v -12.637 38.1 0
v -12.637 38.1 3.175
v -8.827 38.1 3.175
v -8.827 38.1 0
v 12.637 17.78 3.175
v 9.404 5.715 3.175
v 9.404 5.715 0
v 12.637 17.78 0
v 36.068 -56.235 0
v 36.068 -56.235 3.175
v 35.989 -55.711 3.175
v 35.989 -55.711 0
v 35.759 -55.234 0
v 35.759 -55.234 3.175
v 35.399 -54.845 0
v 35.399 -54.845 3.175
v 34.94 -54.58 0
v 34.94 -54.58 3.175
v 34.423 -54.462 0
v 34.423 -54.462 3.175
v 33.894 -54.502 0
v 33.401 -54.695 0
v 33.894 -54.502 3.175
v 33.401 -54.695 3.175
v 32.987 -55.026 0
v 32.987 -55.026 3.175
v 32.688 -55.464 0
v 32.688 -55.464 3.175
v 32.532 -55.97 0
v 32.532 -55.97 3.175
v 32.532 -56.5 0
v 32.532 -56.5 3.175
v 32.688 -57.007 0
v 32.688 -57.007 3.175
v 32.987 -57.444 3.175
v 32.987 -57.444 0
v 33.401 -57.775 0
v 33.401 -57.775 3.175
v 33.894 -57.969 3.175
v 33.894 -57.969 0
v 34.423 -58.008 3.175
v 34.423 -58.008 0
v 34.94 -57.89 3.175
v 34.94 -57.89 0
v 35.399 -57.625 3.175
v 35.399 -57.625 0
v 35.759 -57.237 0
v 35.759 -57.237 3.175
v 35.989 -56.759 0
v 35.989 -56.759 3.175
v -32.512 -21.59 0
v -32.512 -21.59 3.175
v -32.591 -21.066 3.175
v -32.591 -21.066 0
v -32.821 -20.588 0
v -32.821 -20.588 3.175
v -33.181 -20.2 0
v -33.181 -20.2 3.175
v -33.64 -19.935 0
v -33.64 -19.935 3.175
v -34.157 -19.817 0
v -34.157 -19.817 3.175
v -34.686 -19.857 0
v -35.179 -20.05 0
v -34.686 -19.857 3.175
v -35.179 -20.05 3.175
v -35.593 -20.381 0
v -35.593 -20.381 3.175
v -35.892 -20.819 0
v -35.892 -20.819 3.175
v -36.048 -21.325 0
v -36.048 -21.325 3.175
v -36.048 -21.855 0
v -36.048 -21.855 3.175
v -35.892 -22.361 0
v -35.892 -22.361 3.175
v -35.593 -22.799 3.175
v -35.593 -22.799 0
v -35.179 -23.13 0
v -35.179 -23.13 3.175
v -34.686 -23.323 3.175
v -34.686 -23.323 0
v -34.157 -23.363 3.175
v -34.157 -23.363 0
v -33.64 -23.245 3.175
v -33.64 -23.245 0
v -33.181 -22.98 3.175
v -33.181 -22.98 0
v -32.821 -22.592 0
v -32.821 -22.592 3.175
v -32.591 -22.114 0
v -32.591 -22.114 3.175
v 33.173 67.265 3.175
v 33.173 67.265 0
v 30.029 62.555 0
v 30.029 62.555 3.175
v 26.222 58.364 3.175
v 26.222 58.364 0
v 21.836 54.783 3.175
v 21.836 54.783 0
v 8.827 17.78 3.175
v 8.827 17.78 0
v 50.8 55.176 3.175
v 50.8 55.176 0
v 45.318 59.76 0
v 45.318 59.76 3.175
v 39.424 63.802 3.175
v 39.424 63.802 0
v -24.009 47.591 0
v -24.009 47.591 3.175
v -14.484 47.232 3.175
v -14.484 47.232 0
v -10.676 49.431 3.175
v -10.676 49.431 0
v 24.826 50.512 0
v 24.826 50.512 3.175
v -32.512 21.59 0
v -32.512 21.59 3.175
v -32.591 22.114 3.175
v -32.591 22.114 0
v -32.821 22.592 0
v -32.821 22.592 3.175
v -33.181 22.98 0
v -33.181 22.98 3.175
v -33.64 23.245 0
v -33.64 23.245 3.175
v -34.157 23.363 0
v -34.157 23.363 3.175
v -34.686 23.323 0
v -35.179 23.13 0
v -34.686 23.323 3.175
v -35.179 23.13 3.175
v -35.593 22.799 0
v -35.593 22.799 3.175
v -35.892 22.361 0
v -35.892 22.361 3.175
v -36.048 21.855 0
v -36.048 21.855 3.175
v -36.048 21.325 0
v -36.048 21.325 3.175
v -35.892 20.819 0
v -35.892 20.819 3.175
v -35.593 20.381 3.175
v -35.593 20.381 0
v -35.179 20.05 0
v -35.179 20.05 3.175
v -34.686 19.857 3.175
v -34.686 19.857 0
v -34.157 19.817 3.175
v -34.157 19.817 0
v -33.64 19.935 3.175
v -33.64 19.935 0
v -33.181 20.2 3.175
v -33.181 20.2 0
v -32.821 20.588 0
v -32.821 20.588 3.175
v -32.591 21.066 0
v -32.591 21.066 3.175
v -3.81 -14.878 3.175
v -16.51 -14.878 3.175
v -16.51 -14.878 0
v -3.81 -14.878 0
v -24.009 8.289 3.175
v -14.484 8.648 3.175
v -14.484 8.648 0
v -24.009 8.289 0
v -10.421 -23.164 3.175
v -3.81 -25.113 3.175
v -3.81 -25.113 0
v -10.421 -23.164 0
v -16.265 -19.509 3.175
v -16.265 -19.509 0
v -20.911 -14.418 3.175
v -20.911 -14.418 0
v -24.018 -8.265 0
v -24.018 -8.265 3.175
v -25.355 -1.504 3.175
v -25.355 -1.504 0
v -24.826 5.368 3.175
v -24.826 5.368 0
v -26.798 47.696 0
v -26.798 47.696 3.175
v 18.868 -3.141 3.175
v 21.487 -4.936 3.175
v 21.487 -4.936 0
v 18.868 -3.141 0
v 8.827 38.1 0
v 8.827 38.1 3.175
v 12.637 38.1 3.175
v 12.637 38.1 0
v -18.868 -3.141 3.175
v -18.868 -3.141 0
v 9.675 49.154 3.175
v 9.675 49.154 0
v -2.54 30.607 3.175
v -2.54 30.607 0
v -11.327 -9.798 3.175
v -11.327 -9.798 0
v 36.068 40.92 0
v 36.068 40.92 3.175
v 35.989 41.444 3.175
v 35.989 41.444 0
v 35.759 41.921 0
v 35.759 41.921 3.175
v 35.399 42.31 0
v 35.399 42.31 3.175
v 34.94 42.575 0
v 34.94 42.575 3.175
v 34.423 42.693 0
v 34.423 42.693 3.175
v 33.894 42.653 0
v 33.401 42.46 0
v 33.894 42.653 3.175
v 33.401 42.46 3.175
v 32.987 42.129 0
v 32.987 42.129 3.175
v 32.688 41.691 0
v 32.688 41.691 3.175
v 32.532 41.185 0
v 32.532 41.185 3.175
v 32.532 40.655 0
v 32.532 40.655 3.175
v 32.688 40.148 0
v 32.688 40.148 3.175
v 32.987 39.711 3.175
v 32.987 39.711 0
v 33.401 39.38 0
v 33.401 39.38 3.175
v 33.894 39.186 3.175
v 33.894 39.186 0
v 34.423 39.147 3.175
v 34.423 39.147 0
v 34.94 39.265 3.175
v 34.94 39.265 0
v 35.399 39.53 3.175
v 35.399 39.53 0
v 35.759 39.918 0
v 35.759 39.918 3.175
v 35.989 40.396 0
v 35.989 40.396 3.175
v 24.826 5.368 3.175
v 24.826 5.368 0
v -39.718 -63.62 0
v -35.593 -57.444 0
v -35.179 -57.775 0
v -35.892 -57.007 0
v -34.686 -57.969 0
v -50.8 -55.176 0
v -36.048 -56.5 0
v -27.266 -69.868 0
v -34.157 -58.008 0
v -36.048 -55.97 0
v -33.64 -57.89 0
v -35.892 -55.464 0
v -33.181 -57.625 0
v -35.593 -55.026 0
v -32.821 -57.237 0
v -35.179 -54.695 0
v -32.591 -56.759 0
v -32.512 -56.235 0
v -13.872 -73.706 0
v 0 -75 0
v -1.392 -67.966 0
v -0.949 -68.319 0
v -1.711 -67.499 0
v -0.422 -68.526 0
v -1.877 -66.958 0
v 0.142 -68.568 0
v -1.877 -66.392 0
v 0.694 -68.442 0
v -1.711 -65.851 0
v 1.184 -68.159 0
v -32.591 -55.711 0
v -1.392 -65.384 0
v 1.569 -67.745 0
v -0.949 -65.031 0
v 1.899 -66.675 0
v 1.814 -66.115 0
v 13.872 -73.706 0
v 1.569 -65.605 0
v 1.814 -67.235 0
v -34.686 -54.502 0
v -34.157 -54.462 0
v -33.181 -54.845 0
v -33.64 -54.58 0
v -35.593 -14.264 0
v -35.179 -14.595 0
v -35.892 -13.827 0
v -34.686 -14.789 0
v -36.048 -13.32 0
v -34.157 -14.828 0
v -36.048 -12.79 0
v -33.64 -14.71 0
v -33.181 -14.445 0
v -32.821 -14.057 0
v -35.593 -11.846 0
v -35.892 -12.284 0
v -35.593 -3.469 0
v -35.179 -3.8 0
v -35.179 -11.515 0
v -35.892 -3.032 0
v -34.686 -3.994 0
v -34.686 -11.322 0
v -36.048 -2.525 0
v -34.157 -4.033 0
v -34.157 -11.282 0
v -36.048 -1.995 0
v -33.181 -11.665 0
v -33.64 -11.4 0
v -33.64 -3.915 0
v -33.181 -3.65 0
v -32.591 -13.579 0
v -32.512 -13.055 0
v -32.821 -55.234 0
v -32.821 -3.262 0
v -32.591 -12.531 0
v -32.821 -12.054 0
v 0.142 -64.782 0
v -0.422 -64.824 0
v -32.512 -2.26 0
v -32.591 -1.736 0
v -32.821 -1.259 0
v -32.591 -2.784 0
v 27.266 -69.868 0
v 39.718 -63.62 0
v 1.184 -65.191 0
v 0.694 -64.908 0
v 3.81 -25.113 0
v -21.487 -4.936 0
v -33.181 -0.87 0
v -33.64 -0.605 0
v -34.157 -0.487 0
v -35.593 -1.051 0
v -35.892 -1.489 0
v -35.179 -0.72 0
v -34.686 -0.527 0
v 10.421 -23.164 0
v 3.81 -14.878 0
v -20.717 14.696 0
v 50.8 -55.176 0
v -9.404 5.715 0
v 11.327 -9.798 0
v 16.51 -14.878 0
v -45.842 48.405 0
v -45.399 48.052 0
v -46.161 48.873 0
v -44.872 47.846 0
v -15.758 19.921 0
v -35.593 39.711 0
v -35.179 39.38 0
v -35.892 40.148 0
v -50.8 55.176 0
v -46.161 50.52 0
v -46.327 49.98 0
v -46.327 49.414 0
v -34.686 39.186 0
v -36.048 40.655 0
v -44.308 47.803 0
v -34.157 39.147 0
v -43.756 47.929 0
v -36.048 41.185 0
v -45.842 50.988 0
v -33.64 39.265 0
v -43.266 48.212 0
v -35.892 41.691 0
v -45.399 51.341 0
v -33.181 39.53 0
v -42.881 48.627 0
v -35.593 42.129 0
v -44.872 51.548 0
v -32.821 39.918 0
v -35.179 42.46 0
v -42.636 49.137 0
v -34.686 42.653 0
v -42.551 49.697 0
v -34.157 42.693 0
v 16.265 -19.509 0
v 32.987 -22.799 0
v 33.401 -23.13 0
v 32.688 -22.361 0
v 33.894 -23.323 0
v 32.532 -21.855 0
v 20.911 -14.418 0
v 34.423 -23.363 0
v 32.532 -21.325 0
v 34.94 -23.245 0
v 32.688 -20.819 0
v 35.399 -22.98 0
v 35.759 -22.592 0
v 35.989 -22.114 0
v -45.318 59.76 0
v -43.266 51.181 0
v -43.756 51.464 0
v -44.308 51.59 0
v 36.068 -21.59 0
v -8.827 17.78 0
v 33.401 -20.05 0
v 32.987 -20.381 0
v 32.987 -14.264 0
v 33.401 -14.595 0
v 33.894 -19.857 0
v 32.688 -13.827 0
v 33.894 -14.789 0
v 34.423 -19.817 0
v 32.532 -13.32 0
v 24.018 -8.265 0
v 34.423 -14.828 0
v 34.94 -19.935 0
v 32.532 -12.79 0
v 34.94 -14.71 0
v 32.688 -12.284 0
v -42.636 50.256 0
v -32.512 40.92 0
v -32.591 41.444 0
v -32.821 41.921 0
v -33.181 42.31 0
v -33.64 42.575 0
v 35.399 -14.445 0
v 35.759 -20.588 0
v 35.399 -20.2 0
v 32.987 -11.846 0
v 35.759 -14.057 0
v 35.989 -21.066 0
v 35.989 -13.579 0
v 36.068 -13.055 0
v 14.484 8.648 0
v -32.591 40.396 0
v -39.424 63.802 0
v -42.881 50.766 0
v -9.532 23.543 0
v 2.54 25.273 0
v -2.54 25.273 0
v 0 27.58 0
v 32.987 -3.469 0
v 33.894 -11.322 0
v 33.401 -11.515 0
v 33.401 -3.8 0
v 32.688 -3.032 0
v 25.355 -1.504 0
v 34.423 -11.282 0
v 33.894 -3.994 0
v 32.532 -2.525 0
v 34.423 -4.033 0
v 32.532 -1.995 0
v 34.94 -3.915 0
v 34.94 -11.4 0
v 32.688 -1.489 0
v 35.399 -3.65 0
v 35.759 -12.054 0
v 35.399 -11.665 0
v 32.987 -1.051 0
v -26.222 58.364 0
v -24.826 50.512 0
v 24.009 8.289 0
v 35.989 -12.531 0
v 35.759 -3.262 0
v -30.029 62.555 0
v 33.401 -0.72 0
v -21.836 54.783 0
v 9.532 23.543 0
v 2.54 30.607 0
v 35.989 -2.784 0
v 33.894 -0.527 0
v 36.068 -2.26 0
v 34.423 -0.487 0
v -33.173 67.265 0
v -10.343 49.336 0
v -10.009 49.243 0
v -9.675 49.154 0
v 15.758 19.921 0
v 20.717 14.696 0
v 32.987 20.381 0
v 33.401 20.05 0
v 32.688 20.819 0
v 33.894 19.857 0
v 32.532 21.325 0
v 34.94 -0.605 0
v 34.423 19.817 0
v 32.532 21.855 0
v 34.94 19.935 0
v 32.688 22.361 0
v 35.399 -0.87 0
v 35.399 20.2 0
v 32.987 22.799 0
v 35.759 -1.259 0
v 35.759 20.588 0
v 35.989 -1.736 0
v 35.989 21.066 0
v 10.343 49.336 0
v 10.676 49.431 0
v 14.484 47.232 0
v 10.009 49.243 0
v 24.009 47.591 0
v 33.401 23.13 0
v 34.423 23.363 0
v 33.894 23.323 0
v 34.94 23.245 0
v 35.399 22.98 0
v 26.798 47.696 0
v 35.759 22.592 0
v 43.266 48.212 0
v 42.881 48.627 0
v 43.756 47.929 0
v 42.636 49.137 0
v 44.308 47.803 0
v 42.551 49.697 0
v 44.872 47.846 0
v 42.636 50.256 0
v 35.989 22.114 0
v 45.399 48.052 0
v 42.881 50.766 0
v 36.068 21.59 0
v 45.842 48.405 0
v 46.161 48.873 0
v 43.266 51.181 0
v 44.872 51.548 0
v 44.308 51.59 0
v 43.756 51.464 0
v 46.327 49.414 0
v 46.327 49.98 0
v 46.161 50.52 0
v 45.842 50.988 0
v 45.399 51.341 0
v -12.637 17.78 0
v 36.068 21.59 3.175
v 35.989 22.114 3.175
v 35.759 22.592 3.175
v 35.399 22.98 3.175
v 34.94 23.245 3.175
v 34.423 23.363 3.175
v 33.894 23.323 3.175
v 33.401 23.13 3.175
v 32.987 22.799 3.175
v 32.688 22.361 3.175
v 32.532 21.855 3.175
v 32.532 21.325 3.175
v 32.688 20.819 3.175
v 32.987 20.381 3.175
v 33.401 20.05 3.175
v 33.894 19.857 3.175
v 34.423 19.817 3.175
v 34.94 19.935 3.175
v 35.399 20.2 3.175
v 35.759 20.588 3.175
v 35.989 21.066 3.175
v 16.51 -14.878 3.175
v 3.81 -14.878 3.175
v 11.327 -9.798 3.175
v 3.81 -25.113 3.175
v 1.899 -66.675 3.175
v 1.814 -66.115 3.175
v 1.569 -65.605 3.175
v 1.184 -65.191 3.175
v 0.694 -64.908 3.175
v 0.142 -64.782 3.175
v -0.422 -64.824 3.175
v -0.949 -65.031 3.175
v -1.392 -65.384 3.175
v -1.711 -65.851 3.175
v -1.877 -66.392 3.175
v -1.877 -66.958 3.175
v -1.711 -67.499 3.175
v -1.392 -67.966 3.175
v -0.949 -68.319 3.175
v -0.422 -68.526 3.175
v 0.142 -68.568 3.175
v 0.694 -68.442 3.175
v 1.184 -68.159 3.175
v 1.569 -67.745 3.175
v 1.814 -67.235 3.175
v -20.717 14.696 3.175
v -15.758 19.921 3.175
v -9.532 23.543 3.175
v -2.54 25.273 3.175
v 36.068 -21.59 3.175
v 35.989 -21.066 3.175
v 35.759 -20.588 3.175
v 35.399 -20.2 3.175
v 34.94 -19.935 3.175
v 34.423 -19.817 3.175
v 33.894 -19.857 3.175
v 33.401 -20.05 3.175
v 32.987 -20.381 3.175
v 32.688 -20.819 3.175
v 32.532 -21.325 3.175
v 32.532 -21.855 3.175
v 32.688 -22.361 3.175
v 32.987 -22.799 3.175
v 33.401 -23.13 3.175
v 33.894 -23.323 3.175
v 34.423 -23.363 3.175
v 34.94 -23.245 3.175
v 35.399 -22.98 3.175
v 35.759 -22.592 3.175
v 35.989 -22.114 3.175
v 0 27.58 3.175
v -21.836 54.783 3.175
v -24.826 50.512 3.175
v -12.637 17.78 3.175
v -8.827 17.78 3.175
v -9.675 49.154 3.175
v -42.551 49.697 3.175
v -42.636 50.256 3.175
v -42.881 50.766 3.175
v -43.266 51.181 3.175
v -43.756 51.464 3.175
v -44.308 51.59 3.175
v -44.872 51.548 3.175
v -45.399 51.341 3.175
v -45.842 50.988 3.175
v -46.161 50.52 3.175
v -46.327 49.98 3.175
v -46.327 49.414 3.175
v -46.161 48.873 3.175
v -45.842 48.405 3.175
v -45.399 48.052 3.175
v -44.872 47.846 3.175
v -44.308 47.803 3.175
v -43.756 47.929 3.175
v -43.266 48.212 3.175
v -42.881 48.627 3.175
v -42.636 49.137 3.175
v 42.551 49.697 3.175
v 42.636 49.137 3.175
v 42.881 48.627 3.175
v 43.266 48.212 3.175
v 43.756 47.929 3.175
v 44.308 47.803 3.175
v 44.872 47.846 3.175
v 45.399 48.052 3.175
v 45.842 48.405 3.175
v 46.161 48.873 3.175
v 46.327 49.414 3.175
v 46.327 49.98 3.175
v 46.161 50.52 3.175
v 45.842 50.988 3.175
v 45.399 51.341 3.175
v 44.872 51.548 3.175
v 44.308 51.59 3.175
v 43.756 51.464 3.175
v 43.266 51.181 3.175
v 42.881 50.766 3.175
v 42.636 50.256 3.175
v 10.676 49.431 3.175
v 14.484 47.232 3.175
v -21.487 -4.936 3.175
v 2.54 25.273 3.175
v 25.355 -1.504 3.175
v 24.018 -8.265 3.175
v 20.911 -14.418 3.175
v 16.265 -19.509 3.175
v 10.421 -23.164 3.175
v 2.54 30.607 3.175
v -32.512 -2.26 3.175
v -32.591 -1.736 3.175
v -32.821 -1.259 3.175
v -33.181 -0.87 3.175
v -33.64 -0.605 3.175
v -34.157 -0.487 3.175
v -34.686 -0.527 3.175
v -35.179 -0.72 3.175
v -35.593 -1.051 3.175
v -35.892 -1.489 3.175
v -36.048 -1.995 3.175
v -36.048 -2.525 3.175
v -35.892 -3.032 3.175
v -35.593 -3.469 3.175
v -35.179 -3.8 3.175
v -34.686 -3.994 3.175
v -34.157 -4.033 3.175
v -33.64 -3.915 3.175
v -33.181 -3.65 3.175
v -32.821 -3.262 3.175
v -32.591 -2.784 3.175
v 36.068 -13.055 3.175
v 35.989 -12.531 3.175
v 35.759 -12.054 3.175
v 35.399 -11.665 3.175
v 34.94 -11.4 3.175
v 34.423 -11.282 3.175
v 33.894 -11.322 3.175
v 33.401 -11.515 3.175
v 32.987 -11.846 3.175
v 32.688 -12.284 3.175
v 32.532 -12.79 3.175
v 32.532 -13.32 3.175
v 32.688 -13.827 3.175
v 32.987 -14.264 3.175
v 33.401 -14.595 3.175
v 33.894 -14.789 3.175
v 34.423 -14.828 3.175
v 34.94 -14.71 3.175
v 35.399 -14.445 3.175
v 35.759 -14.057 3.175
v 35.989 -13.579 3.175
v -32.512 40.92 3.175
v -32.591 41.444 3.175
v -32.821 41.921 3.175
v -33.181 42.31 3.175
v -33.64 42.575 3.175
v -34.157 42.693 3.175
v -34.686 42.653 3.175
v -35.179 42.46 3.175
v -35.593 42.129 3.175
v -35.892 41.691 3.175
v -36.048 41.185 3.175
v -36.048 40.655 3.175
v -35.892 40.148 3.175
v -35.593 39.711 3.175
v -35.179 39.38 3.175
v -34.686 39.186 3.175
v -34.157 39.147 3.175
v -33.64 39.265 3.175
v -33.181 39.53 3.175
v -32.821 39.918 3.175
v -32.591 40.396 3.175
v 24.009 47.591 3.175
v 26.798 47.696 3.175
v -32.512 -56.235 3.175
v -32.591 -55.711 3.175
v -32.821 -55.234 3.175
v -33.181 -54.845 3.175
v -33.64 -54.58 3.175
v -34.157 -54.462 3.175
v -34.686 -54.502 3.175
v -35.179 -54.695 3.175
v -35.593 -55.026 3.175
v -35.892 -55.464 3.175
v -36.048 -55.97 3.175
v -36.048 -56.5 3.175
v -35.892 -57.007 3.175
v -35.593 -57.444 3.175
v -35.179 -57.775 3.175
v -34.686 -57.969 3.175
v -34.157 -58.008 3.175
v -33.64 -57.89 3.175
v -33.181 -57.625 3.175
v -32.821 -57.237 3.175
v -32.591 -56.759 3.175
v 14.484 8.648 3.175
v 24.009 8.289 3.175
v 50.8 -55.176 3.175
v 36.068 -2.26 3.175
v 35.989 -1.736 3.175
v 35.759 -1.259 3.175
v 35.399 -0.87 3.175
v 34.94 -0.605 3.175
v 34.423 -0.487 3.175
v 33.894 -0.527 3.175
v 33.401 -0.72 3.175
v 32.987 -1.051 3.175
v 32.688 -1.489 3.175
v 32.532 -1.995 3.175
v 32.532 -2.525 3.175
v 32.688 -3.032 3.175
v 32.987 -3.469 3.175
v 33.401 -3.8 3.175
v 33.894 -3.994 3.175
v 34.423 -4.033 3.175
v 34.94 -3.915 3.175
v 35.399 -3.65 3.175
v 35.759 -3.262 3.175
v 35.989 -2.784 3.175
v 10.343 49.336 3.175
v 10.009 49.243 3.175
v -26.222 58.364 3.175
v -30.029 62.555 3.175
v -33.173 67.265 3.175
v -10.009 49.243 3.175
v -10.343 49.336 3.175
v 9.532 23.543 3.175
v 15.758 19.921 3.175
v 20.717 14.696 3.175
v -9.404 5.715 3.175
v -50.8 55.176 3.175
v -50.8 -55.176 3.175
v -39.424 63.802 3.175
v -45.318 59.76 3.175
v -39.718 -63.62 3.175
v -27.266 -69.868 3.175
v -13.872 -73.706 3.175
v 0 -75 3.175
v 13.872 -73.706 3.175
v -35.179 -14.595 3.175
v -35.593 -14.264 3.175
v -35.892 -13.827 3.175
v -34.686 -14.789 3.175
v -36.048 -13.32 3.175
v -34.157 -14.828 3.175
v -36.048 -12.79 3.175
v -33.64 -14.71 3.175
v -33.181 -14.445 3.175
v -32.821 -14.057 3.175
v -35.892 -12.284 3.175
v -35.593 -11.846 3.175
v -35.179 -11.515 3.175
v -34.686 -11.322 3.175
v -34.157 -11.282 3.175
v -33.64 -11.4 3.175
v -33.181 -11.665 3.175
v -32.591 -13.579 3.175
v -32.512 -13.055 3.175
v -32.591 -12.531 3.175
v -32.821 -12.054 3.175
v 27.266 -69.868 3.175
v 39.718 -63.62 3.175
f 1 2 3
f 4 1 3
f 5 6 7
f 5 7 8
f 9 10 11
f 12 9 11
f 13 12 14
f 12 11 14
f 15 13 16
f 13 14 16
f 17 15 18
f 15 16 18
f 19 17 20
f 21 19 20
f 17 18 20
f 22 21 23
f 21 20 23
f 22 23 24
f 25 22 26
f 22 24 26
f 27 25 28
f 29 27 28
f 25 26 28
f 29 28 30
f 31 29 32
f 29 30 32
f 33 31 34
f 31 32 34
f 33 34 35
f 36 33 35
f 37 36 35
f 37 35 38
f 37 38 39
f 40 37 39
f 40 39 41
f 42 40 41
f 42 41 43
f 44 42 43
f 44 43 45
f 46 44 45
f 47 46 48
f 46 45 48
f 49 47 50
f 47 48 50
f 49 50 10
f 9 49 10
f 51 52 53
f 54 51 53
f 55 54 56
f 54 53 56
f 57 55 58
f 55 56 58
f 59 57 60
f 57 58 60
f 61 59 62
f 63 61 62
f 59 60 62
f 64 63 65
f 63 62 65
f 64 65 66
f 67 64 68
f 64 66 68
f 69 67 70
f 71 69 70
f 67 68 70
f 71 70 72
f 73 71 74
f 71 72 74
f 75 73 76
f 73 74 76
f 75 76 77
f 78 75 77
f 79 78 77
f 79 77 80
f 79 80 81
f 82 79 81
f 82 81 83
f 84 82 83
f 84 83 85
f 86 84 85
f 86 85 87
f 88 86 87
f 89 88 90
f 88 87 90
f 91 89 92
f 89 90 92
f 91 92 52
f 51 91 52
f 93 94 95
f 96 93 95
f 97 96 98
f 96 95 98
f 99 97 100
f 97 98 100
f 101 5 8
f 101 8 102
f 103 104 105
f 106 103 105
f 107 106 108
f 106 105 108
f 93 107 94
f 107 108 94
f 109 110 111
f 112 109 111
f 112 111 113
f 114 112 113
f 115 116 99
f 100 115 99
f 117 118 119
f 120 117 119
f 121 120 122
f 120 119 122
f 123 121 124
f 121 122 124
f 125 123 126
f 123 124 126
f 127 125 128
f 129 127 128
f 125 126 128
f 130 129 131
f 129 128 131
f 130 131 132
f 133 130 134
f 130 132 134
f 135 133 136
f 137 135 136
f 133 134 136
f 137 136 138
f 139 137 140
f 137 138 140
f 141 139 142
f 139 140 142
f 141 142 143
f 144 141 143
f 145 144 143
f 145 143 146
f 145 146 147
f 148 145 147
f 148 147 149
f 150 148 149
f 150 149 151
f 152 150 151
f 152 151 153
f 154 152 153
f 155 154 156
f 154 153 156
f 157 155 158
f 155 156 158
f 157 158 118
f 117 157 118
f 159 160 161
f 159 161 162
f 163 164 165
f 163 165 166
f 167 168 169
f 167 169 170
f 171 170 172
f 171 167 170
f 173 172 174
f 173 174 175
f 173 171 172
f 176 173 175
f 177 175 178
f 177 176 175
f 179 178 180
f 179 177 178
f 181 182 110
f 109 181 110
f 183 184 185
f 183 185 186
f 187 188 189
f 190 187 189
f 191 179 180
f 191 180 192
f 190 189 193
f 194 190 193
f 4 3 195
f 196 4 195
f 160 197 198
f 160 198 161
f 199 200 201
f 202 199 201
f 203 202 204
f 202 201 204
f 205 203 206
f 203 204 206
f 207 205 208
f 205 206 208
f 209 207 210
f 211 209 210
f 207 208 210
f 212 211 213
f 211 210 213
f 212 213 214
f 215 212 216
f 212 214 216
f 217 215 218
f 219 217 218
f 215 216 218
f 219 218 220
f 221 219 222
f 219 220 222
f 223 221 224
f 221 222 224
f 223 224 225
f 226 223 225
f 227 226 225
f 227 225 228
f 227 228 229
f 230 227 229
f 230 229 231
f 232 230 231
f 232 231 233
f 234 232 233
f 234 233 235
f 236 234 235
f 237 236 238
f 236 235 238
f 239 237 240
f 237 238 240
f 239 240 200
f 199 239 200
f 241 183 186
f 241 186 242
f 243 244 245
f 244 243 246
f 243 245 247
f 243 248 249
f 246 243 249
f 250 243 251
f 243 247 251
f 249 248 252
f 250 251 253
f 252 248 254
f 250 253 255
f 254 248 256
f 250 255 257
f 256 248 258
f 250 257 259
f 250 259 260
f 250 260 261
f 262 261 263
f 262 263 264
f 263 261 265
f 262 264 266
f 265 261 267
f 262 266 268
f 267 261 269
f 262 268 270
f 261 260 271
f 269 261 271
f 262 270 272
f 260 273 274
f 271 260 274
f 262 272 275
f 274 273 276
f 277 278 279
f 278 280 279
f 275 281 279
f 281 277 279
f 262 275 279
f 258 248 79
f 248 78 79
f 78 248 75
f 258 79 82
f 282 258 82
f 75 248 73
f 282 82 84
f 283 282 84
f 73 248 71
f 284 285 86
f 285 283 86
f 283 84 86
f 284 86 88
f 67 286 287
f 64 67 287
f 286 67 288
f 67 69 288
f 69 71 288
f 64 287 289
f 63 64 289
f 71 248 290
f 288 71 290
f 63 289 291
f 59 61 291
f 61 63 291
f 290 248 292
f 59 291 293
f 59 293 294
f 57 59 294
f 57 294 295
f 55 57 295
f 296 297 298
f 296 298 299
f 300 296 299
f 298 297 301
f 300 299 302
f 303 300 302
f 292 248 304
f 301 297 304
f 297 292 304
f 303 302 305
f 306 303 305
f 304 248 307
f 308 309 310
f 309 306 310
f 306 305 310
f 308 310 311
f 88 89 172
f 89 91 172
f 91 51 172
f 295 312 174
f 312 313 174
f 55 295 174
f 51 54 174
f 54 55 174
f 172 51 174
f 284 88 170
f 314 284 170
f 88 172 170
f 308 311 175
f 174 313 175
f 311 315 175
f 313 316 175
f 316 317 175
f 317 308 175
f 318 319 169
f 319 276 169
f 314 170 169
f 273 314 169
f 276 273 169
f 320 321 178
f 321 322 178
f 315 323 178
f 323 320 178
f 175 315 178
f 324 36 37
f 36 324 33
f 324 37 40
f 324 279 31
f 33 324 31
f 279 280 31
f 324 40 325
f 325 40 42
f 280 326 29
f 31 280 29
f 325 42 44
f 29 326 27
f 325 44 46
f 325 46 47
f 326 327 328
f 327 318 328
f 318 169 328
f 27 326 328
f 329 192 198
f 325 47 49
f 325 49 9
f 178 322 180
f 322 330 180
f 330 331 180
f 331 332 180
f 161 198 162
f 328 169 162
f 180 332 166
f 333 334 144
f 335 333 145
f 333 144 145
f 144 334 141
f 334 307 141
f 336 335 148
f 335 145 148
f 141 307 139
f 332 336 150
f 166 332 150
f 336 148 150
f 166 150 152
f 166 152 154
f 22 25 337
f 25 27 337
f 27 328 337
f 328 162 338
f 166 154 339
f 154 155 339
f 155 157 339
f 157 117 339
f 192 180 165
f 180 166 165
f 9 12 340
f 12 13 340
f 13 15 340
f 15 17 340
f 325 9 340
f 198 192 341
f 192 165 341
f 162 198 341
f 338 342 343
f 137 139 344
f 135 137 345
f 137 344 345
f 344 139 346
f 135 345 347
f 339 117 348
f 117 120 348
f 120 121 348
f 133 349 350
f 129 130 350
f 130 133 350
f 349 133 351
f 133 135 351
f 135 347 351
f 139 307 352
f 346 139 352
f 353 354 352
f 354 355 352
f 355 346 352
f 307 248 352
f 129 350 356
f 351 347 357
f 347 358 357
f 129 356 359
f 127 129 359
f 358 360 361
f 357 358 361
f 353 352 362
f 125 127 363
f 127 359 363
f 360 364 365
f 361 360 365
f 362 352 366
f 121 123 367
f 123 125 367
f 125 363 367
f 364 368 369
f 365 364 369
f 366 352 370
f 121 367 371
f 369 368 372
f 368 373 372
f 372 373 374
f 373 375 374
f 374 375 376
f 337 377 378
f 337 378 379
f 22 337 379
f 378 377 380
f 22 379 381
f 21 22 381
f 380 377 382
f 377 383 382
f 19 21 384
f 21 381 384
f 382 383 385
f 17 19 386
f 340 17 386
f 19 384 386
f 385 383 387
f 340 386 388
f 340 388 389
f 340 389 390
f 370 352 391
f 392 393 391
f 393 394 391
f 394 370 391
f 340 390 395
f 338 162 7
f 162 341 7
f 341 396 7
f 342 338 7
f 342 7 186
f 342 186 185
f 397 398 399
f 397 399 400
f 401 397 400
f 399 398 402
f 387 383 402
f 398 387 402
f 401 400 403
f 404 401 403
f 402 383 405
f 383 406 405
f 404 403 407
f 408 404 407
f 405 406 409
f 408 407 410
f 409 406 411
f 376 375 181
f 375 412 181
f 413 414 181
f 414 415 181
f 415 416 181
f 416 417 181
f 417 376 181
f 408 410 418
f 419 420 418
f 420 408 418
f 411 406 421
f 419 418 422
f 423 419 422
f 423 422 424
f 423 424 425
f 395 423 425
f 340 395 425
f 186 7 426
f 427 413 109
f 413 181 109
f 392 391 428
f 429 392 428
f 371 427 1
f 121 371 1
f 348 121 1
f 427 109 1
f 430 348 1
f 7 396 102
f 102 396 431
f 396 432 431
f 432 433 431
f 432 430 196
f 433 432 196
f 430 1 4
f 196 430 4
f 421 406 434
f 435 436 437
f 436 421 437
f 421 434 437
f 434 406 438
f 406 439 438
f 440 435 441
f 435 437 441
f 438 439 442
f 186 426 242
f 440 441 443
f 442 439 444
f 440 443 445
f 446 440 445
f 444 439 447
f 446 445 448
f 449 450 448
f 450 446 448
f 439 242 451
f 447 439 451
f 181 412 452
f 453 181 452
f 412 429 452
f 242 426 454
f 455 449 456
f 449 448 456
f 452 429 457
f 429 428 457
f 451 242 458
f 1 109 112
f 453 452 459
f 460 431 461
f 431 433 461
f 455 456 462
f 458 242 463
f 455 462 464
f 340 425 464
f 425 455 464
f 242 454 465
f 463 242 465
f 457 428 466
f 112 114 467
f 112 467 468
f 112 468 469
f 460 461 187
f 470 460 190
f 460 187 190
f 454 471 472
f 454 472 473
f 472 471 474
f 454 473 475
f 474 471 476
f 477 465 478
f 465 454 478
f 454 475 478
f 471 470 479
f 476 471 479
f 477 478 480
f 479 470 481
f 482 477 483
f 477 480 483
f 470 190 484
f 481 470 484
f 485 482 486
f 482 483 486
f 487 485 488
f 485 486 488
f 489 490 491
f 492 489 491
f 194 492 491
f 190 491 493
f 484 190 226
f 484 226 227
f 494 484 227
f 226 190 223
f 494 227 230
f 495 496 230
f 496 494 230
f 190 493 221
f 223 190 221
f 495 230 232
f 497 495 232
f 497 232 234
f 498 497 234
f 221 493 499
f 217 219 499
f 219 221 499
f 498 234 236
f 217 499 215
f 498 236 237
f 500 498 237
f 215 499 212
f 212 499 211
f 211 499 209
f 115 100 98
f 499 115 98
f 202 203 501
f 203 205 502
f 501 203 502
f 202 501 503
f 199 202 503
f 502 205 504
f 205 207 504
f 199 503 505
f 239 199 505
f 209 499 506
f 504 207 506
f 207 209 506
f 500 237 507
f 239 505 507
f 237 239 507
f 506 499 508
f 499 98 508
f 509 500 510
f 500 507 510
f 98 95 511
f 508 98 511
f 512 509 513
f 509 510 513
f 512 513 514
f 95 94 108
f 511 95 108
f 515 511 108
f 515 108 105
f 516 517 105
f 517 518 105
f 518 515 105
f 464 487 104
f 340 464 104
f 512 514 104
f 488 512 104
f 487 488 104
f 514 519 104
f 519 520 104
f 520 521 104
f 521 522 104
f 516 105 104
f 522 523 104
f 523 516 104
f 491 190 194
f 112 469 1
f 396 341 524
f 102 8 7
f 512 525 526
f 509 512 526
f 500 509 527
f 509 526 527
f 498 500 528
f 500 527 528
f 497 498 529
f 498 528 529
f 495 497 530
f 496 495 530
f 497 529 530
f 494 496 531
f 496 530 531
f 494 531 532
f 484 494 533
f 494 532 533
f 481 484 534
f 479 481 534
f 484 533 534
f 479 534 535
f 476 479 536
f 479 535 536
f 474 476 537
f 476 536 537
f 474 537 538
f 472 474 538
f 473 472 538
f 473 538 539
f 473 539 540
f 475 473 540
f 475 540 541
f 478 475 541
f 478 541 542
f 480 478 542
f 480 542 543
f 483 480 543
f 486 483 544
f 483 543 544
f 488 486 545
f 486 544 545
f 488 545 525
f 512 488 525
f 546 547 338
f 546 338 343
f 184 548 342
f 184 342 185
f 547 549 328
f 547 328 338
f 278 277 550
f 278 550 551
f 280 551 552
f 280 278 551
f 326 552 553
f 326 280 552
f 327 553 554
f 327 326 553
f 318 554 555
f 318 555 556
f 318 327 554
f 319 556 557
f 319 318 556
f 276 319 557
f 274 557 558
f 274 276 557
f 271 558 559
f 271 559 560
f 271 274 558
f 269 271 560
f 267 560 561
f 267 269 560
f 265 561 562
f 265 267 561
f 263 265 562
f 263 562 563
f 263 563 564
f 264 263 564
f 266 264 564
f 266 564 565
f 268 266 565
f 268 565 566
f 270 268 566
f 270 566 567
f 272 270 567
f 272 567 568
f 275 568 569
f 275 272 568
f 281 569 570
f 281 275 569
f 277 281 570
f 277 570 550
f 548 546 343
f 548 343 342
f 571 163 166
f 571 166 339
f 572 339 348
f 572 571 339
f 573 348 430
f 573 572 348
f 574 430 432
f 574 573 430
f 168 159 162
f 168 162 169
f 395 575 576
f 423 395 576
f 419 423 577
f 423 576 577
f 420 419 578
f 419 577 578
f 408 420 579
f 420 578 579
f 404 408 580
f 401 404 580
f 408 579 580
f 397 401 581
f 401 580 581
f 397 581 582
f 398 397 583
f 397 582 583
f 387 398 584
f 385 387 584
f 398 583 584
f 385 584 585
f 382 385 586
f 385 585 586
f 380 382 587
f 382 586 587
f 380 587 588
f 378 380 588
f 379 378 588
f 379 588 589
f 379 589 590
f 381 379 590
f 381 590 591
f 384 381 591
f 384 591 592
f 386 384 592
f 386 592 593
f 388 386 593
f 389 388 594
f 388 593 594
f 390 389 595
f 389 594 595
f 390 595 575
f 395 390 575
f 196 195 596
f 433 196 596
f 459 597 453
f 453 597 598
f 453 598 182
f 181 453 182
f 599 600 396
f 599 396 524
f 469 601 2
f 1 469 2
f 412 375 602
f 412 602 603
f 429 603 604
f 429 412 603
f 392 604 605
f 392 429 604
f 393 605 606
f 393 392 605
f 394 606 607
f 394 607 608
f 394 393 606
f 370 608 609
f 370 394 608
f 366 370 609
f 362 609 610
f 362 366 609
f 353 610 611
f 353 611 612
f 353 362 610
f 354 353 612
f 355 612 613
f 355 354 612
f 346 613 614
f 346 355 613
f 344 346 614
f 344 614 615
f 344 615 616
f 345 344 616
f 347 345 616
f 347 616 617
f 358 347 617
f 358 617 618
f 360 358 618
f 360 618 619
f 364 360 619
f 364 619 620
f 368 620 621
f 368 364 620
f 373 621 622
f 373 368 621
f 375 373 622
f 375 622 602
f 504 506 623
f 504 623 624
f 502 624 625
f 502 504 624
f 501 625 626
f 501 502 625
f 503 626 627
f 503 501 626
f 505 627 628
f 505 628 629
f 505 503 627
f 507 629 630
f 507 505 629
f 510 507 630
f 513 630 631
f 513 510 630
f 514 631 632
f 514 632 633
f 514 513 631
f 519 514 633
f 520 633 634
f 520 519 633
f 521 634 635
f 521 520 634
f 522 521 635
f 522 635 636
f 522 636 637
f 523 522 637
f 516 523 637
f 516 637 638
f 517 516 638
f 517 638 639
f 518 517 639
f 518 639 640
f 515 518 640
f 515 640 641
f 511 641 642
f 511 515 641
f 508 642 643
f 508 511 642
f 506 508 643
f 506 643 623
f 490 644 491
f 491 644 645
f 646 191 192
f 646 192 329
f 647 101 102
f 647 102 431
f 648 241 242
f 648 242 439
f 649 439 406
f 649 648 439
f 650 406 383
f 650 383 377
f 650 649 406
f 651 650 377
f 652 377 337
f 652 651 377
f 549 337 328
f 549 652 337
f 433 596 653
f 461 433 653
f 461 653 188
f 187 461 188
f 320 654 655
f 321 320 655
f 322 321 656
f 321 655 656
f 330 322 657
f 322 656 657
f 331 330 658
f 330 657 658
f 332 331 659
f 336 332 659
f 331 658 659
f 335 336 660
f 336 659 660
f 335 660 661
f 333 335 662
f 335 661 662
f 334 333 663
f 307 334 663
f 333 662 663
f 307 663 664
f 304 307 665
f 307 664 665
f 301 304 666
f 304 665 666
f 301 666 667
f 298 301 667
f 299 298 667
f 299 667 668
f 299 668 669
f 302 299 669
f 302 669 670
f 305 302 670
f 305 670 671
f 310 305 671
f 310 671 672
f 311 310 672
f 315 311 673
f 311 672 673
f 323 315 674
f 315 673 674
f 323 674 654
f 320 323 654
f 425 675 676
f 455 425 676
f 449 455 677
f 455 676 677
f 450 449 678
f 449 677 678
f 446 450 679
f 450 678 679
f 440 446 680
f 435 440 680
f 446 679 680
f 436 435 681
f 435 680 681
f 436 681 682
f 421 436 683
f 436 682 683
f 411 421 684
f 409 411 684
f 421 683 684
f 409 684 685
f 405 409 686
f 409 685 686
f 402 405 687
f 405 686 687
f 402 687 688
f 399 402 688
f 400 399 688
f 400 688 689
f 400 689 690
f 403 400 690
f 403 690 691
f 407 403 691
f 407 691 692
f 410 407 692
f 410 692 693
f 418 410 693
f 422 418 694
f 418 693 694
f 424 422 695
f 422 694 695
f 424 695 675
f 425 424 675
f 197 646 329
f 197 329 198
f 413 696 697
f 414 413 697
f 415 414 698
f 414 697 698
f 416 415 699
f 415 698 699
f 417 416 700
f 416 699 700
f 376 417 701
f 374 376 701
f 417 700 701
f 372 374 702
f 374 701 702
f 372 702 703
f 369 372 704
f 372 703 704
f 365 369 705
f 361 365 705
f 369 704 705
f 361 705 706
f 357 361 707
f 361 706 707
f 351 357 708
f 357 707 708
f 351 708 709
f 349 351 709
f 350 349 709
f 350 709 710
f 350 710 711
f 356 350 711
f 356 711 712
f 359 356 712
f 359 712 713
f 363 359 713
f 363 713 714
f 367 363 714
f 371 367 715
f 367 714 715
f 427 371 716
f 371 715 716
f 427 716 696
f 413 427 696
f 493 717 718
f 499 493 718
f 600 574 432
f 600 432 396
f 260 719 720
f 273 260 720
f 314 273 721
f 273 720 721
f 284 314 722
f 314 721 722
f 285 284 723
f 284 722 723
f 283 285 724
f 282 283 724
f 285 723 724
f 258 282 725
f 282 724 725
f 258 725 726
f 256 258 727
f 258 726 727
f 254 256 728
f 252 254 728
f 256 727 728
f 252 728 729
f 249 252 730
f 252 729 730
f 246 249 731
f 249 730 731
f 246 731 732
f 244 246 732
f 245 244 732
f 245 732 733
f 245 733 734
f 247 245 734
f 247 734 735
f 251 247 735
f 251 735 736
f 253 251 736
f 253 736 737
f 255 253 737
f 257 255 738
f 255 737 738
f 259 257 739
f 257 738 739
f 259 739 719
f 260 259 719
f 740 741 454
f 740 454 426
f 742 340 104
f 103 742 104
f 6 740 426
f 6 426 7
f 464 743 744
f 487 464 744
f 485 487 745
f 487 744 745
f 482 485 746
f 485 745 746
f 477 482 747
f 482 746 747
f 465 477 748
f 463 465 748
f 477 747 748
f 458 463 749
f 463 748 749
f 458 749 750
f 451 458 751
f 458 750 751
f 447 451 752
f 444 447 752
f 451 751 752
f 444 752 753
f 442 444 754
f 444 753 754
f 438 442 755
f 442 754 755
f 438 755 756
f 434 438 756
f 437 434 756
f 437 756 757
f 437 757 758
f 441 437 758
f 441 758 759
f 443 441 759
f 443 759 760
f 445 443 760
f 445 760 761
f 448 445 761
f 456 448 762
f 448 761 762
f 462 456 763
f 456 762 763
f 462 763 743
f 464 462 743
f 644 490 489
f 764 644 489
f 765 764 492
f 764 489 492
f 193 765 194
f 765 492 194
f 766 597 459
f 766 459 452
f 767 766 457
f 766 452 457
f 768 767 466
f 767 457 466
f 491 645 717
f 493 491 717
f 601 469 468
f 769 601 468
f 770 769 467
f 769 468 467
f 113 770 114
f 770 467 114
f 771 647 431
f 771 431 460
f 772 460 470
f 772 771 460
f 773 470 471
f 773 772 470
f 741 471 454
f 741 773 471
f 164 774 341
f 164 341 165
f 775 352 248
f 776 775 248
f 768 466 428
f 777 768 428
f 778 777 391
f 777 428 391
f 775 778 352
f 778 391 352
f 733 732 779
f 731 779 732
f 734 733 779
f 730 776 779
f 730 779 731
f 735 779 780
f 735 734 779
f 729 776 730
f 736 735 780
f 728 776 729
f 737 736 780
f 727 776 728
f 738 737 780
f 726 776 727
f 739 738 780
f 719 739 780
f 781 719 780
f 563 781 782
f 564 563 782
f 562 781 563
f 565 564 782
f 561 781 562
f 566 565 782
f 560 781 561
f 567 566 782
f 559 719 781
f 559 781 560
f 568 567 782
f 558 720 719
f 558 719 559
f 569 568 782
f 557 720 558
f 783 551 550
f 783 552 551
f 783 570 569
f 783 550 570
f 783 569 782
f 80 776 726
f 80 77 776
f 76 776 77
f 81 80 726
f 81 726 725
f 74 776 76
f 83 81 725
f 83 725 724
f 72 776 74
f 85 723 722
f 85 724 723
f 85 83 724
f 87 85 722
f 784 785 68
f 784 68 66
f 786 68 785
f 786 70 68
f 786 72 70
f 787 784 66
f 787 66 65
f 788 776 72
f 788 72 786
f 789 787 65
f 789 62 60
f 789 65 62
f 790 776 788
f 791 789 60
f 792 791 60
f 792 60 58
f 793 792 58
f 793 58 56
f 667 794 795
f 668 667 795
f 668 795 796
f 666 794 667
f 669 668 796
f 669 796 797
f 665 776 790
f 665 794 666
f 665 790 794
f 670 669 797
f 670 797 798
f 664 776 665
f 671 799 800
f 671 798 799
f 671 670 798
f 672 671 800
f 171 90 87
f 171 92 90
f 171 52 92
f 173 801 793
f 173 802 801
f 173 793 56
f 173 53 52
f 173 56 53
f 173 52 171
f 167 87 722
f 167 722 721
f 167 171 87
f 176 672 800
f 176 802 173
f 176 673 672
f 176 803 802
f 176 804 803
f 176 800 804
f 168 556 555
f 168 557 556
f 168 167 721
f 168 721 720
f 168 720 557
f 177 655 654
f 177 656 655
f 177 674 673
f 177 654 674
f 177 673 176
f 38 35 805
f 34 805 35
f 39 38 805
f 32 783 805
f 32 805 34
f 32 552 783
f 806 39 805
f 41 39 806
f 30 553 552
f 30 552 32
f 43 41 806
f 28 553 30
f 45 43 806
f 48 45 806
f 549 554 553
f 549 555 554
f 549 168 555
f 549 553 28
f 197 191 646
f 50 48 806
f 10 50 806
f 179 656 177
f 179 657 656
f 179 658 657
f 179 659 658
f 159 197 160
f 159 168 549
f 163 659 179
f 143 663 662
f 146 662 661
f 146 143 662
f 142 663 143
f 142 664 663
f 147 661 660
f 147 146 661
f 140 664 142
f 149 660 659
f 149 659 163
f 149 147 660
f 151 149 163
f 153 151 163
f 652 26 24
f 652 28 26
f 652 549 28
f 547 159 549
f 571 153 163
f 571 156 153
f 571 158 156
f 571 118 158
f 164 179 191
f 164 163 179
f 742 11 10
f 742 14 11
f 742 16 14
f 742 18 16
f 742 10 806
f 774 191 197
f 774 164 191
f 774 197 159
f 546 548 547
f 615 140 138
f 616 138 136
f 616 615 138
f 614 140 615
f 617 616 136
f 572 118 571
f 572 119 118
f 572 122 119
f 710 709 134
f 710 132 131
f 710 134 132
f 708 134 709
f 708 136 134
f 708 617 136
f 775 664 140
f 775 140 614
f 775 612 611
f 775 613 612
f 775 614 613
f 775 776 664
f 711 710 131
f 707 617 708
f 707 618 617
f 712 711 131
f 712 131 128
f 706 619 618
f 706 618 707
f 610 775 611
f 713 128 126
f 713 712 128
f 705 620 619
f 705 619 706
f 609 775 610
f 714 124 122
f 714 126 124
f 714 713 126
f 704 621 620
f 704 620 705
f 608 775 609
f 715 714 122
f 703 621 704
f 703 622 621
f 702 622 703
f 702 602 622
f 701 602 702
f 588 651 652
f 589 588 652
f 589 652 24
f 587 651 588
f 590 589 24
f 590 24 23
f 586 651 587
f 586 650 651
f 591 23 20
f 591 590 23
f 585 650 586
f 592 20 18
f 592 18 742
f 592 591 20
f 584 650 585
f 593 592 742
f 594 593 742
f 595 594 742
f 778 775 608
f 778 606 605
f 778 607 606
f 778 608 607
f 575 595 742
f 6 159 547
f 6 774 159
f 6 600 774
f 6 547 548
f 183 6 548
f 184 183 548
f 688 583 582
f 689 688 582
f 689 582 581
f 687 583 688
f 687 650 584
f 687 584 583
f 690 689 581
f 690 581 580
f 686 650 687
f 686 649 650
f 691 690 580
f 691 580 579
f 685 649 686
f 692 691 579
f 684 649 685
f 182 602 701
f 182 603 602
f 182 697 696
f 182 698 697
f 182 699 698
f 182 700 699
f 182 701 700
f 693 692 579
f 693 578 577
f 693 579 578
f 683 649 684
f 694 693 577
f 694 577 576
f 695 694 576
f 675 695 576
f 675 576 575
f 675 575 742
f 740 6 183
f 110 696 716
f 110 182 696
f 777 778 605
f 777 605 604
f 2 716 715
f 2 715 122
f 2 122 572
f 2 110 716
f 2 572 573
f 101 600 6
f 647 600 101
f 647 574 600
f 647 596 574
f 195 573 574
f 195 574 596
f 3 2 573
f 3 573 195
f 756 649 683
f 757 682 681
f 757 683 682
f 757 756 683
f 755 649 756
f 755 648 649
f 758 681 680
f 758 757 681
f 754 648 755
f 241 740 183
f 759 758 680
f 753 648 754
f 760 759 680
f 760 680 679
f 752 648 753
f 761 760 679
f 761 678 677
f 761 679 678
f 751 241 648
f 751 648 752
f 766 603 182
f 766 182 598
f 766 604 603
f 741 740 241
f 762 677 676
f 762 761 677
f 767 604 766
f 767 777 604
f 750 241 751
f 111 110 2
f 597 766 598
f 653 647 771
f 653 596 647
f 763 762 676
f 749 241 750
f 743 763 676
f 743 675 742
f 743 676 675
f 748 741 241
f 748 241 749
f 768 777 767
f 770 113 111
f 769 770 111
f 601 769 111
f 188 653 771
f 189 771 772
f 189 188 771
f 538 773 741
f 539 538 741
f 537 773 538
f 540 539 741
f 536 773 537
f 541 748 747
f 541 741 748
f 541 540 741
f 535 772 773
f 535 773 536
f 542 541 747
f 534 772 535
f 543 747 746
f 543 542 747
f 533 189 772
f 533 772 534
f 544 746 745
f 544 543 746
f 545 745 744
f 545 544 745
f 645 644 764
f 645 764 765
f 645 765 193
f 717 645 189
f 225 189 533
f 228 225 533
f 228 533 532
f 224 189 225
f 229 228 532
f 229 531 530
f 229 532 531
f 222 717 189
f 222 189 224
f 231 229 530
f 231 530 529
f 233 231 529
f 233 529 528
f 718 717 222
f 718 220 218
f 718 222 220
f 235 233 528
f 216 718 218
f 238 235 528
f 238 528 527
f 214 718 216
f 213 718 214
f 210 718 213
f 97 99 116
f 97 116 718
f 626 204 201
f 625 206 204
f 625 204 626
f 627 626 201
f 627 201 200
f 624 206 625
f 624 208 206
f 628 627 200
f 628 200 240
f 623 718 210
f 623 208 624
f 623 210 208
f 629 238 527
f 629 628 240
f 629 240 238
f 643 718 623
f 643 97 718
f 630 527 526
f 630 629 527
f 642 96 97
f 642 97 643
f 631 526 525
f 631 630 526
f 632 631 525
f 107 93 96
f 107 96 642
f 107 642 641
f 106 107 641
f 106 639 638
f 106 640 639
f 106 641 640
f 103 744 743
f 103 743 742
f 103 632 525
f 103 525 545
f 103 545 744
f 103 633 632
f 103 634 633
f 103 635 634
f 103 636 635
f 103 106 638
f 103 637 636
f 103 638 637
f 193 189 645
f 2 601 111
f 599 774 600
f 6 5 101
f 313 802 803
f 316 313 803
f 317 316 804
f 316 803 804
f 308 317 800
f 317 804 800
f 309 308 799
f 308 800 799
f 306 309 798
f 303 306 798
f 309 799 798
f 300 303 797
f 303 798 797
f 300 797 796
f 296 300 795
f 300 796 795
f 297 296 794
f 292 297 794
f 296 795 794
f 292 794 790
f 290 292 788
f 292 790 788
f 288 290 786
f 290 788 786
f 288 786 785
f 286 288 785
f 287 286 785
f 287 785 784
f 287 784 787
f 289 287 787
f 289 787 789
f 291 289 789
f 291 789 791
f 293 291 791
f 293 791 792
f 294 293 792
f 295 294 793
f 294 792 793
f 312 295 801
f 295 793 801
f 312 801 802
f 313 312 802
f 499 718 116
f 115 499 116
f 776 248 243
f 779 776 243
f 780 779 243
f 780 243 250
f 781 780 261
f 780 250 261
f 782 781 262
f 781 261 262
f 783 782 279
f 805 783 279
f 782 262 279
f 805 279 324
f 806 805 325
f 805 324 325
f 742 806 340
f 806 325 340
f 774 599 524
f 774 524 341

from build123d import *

# Parameters (mm, degrees)
SKETCH1_R           = 1.89865
BOSS_EXTRUDE3_DEPTH = 3.175
CUT_EXTRUDE2_DEPTH  = 3.175
SKETCH4_R           = 1.778
CUT_EXTRUDE3_DEPTH  = 3.175
SKETCH5_R           = 1.778
CUT_EXTRUDE4_DEPTH  = 3.175
CUT_EXTRUDE5_DEPTH  = 3.175


with BuildPart() as part:
    # Sketch1 → Boss-Extrude3 (new body)
    with BuildSketch(Plane.XY):
        with BuildLine():
            Line((-50.8, 55.175719298), (-50.8, -55.175719298))
            ThreePointArc((-50.8, -55.175719298), (0, -75), (50.8, -55.175719298))
            Line((50.8, -55.175719298), (50.8, 55.175719298))
            ThreePointArc((50.8, 55.175719298), (42.419210034, 61.851520758), (33.172661219, 67.264957799))
            ThreePointArc((33.172661219, 67.264957799), (0, 47.904876359), (-33.172661219, 67.264957799))
            ThreePointArc((-33.172661219, 67.264957799), (-42.419210034, 61.851520758), (-50.8, 55.175719298))
        make_face()
        with Locations((0, -66.675)):
            Circle(SKETCH1_R, mode=Mode.SUBTRACT)
        with Locations((-44.45, 49.6966108)):
            Circle(SKETCH1_R, mode=Mode.SUBTRACT)
        with Locations(Location((44.45, 49.6966108, 0), (0, 0, 180))):
            Circle(SKETCH1_R, mode=Mode.SUBTRACT)
    extrude(amount=BOSS_EXTRUDE3_DEPTH)

    # Sketch3 → Cut-Extrude2 (cut)
    with BuildSketch(Plane.XY.offset(3.175)):
        with BuildLine():
            Line((8.827105782, 17.78), (2.54, 25.272680903))
            ThreePointArc((2.54, 25.272680903), (15.758317518, 19.920728626), (24.009298775, 8.289365013))
            Line((24.009298775, 8.289365013), (14.484298775, 8.647939367))
            Line((14.484298775, 8.647939367), (9.404298775, 5.715))
            Line((9.404298775, 5.715), (12.637105782, 17.78))
            Line((12.637105782, 17.78), (8.827105782, 17.78))
        make_face()
        with BuildLine():
            Line((18.868143133, -3.140634987), (24.826209076, 5.368365013))
            ThreePointArc((24.826209076, 5.368365013), (20.911260009, -14.418016674), (3.81, -25.112624315))
            Line((3.81, -25.112624315), (3.81, -14.877877919))
            Line((3.81, -14.877877919), (16.51, -14.877877919))
            Line((16.51, -14.877877919), (11.327081569, -9.797877919))
            Line((11.327081569, -9.797877919), (21.487081569, -4.935568543))
            Line((21.487081569, -4.935568543), (18.868143133, -3.140634987))
        make_face()
        with BuildLine():
            Line((-3.81, -14.877877919), (-3.81, -25.112624315))
            ThreePointArc((-3.81, -25.112624315), (-20.911260009, -14.418016674), (-24.826209076, 5.368365013))
            Line((-24.826209076, 5.368365013), (-18.868143133, -3.140634987))
            Line((-18.868143133, -3.140634987), (-21.487081569, -4.935568543))
            Line((-21.487081569, -4.935568543), (-11.327081569, -9.797877919))
            Line((-11.327081569, -9.797877919), (-16.51, -14.877877919))
            Line((-16.51, -14.877877919), (-3.81, -14.877877919))
        make_face()
        with BuildLine():
            Line((-14.484298775, 8.647939367), (-24.009298775, 8.289365013))
            ThreePointArc((-24.009298775, 8.289365013), (-15.758317518, 19.920728626), (-2.54, 25.272680903))
            Line((-2.54, 25.272680903), (-8.827105782, 17.78))
            Line((-8.827105782, 17.78), (-12.637105782, 17.78))
            Line((-12.637105782, 17.78), (-9.404298775, 5.715))
            Line((-9.404298775, 5.715), (-14.484298775, 8.647939367))
        make_face()
    extrude(amount=-CUT_EXTRUDE2_DEPTH, mode=Mode.SUBTRACT)

    # Sketch4 → Cut-Extrude3 (cut)
    with BuildSketch(Plane.XY.offset(3.175)):
        with Locations((-34.29, 40.919876359)):
            Circle(SKETCH4_R)
        with Locations((34.29, 40.919876359)):
            Circle(SKETCH4_R)
        with Locations((34.29, -2.260123641)):
            Circle(SKETCH4_R)
        with Locations((-34.29, -2.260123641)):
            Circle(SKETCH4_R)
        with Locations((-34.29, -13.055123641)):
            Circle(SKETCH4_R)
        with Locations((34.29, -13.055123641)):
            Circle(SKETCH4_R)
        with Locations((34.29, -56.235123641)):
            Circle(SKETCH4_R)
        with Locations((-34.29, -56.235123641)):
            Circle(SKETCH4_R)
    extrude(amount=-CUT_EXTRUDE3_DEPTH, mode=Mode.SUBTRACT)

    # Sketch5 → Cut-Extrude4 (cut)
    with BuildSketch(Plane.XY.offset(3.175)):
        with Locations((-34.29, 21.59)):
            Circle(SKETCH5_R)
        with Locations((34.29, 21.59)):
            Circle(SKETCH5_R)
        with Locations((34.29, -21.59)):
            Circle(SKETCH5_R)
        with Locations((-34.29, -21.59)):
            Circle(SKETCH5_R)
    extrude(amount=-CUT_EXTRUDE4_DEPTH, mode=Mode.SUBTRACT)

    # Sketch6 → Cut-Extrude5 (cut)
    with BuildSketch(Plane.XY.offset(3.175)):
        Polygon((-8.827105782, 38.1), (-2.54, 30.607319097), (0, 27.580264972), (2.54, 30.607319097), (8.827105782, 38.1), (12.637105782, 38.1), (9.404298775, 50.165), (14.484298775, 47.232060633), (24.009298775, 47.590634987), (26.798005722, 47.695617537), (24.826209076, 50.511634987), (18.868143133, 59.020634987), (-18.868143133, 59.020634987), (-24.826209076, 50.511634987), (-26.798005722, 47.695617537), (-24.009298775, 47.590634987), (-14.484298775, 47.232060633), (-9.404298775, 50.165), (-12.637105782, 38.1), align=None)
    extrude(amount=-CUT_EXTRUDE5_DEPTH, mode=Mode.SUBTRACT)


solid = part.part
